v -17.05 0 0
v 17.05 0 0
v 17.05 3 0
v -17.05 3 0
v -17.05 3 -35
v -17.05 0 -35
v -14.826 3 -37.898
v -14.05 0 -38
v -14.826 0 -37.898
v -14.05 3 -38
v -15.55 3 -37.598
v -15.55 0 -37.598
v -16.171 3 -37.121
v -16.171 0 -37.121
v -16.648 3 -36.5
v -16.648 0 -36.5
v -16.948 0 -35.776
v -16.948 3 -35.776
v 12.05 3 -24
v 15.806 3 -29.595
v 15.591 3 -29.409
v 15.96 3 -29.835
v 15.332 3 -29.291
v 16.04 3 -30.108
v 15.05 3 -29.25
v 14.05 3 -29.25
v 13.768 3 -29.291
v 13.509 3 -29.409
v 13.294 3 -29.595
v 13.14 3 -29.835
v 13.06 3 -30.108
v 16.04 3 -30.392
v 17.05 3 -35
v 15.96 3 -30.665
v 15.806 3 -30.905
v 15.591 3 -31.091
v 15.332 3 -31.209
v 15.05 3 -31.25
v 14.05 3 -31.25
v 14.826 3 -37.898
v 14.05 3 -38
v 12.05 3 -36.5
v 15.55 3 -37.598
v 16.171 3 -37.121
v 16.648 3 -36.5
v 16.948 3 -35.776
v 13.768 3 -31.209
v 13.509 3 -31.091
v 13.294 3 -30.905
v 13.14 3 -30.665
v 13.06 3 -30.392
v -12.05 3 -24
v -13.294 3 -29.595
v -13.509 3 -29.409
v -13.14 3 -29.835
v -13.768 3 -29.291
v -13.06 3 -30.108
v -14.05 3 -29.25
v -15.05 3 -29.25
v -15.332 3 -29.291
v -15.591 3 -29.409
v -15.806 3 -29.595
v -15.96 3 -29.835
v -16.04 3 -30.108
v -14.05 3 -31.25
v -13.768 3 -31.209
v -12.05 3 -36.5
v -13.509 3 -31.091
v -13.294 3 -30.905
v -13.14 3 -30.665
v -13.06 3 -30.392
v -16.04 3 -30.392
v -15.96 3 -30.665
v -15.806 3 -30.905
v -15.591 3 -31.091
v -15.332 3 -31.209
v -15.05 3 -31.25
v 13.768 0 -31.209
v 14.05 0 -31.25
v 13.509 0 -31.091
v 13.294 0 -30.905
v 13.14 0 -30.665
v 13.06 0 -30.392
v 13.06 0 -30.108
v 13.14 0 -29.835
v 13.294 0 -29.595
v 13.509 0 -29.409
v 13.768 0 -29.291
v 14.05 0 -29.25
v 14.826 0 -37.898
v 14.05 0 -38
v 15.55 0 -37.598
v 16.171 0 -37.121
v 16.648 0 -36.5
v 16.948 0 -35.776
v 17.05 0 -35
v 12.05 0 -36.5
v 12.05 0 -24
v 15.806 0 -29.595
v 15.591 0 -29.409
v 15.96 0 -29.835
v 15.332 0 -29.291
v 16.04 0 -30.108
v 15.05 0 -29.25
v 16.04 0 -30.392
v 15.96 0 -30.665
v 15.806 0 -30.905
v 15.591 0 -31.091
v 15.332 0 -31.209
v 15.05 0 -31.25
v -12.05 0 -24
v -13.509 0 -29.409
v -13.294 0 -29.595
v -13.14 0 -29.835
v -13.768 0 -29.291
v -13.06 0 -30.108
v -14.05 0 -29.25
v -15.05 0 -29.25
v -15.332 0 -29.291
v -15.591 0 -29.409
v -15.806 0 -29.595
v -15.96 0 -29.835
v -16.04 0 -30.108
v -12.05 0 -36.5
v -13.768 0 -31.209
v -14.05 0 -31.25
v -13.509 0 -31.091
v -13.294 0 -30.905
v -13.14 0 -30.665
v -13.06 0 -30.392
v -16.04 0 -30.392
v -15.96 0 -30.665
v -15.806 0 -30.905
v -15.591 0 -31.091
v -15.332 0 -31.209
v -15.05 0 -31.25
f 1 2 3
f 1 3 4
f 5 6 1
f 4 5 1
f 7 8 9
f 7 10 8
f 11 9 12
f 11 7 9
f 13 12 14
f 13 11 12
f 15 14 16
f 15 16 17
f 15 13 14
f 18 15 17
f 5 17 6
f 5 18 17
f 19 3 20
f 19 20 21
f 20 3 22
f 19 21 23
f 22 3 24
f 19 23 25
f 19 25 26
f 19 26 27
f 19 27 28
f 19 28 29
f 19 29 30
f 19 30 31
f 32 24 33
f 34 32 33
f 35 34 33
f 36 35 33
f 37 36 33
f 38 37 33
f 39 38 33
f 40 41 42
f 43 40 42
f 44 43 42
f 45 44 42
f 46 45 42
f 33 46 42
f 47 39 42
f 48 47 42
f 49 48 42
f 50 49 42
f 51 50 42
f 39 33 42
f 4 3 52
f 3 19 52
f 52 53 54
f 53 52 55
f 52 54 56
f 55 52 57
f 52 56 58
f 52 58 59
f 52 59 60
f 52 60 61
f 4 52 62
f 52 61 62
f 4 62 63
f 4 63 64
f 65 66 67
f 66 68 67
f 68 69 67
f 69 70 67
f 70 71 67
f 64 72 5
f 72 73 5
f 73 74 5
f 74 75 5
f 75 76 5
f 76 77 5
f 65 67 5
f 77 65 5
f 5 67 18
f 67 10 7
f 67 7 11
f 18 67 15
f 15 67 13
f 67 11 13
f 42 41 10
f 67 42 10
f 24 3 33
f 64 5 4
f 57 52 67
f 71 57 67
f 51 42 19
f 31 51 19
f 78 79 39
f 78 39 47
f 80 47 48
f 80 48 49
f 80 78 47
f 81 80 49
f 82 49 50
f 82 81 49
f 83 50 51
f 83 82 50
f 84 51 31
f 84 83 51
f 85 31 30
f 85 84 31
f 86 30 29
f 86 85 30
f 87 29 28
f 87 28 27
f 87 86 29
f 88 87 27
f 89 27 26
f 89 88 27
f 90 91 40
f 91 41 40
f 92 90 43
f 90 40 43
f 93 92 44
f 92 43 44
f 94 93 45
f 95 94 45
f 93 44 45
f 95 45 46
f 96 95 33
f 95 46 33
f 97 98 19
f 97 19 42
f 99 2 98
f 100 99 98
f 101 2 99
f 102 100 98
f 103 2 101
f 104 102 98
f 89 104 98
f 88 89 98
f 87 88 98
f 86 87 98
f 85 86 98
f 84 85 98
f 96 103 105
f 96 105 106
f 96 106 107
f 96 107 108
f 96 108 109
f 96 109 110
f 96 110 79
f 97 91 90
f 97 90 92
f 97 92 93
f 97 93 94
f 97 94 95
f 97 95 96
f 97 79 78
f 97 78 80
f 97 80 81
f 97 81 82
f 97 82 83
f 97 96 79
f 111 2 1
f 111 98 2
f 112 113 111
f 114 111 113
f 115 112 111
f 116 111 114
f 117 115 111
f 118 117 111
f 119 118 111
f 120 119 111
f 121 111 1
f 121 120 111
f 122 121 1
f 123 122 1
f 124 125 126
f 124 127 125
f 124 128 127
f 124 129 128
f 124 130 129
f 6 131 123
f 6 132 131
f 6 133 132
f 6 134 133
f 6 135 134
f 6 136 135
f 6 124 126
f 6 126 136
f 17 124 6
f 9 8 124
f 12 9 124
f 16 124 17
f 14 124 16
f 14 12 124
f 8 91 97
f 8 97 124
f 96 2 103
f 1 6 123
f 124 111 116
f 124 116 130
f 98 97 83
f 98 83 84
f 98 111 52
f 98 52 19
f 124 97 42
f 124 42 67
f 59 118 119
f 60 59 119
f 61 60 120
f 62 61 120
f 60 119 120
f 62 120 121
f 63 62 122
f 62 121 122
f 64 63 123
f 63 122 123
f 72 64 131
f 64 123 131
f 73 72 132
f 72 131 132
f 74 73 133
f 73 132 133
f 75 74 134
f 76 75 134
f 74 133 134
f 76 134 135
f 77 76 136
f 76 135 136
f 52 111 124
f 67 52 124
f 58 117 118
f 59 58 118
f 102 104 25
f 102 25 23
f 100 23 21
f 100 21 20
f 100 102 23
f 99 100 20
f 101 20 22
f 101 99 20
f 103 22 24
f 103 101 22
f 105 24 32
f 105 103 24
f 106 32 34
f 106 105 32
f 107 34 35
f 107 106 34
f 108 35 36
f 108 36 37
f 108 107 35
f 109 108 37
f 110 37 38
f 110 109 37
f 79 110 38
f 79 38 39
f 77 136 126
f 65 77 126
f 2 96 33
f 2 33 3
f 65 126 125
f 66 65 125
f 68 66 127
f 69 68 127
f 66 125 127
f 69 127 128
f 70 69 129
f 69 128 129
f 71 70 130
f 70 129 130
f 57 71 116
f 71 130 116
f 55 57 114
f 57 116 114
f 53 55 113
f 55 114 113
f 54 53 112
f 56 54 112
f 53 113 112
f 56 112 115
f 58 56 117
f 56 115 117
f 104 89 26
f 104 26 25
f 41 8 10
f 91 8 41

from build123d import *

# Parameters (mm, degrees)
BOSS_EXTRU_1_DEPTH = 3
CONG_1_R           = 3
CONG_2_R           = 3


with BuildPart() as part:
    # Esquisse1 → Boss.-Extru.1 (new body)
    with BuildSketch(Plane(origin=(0, 0, 0), x_dir=(1, 0, 0), z_dir=(0, 1, 0))):
        Polygon((-12.05, 36.5), (0, 36.5), (0, 38), (-17.05, 38), (-17.05, 0), (0, 0), (0, 24), (-12.05, 24), align=None)
        with BuildLine():
            ThreePointArc((-15.05, 29.25), (-16.05, 30.25), (-15.05, 31.25))
            Line((-15.05, 31.25), (-14.05, 31.25))
            ThreePointArc((-14.05, 31.25), (-13.05, 30.25), (-14.05, 29.25))
            Line((-14.05, 29.25), (-15.05, 29.25))
        make_face(mode=Mode.SUBTRACT)
    boss_extru_1 = extrude(amount=BOSS_EXTRU_1_DEPTH)

    # Symétrie1: Boss.-Extru.1 across plane
    add(boss_extru_1.mirror(Plane(origin=(0, 3, 0), x_dir=(0, 0, 1), z_dir=(-1, 0, 0))))

    # Congé1
    cong_1_edges = [part.edges().sort_by_distance(p)[0] for p in [
        (17.05, 1.5, -38),
    ]]
    fillet(cong_1_edges, radius=CONG_1_R)

    # Congé2
    cong_2_edges = [part.edges().sort_by_distance(p)[0] for p in [
        (-17.05, 1.5, -38),
    ]]
    fillet(cong_2_edges, radius=CONG_2_R)


solid = part.part
